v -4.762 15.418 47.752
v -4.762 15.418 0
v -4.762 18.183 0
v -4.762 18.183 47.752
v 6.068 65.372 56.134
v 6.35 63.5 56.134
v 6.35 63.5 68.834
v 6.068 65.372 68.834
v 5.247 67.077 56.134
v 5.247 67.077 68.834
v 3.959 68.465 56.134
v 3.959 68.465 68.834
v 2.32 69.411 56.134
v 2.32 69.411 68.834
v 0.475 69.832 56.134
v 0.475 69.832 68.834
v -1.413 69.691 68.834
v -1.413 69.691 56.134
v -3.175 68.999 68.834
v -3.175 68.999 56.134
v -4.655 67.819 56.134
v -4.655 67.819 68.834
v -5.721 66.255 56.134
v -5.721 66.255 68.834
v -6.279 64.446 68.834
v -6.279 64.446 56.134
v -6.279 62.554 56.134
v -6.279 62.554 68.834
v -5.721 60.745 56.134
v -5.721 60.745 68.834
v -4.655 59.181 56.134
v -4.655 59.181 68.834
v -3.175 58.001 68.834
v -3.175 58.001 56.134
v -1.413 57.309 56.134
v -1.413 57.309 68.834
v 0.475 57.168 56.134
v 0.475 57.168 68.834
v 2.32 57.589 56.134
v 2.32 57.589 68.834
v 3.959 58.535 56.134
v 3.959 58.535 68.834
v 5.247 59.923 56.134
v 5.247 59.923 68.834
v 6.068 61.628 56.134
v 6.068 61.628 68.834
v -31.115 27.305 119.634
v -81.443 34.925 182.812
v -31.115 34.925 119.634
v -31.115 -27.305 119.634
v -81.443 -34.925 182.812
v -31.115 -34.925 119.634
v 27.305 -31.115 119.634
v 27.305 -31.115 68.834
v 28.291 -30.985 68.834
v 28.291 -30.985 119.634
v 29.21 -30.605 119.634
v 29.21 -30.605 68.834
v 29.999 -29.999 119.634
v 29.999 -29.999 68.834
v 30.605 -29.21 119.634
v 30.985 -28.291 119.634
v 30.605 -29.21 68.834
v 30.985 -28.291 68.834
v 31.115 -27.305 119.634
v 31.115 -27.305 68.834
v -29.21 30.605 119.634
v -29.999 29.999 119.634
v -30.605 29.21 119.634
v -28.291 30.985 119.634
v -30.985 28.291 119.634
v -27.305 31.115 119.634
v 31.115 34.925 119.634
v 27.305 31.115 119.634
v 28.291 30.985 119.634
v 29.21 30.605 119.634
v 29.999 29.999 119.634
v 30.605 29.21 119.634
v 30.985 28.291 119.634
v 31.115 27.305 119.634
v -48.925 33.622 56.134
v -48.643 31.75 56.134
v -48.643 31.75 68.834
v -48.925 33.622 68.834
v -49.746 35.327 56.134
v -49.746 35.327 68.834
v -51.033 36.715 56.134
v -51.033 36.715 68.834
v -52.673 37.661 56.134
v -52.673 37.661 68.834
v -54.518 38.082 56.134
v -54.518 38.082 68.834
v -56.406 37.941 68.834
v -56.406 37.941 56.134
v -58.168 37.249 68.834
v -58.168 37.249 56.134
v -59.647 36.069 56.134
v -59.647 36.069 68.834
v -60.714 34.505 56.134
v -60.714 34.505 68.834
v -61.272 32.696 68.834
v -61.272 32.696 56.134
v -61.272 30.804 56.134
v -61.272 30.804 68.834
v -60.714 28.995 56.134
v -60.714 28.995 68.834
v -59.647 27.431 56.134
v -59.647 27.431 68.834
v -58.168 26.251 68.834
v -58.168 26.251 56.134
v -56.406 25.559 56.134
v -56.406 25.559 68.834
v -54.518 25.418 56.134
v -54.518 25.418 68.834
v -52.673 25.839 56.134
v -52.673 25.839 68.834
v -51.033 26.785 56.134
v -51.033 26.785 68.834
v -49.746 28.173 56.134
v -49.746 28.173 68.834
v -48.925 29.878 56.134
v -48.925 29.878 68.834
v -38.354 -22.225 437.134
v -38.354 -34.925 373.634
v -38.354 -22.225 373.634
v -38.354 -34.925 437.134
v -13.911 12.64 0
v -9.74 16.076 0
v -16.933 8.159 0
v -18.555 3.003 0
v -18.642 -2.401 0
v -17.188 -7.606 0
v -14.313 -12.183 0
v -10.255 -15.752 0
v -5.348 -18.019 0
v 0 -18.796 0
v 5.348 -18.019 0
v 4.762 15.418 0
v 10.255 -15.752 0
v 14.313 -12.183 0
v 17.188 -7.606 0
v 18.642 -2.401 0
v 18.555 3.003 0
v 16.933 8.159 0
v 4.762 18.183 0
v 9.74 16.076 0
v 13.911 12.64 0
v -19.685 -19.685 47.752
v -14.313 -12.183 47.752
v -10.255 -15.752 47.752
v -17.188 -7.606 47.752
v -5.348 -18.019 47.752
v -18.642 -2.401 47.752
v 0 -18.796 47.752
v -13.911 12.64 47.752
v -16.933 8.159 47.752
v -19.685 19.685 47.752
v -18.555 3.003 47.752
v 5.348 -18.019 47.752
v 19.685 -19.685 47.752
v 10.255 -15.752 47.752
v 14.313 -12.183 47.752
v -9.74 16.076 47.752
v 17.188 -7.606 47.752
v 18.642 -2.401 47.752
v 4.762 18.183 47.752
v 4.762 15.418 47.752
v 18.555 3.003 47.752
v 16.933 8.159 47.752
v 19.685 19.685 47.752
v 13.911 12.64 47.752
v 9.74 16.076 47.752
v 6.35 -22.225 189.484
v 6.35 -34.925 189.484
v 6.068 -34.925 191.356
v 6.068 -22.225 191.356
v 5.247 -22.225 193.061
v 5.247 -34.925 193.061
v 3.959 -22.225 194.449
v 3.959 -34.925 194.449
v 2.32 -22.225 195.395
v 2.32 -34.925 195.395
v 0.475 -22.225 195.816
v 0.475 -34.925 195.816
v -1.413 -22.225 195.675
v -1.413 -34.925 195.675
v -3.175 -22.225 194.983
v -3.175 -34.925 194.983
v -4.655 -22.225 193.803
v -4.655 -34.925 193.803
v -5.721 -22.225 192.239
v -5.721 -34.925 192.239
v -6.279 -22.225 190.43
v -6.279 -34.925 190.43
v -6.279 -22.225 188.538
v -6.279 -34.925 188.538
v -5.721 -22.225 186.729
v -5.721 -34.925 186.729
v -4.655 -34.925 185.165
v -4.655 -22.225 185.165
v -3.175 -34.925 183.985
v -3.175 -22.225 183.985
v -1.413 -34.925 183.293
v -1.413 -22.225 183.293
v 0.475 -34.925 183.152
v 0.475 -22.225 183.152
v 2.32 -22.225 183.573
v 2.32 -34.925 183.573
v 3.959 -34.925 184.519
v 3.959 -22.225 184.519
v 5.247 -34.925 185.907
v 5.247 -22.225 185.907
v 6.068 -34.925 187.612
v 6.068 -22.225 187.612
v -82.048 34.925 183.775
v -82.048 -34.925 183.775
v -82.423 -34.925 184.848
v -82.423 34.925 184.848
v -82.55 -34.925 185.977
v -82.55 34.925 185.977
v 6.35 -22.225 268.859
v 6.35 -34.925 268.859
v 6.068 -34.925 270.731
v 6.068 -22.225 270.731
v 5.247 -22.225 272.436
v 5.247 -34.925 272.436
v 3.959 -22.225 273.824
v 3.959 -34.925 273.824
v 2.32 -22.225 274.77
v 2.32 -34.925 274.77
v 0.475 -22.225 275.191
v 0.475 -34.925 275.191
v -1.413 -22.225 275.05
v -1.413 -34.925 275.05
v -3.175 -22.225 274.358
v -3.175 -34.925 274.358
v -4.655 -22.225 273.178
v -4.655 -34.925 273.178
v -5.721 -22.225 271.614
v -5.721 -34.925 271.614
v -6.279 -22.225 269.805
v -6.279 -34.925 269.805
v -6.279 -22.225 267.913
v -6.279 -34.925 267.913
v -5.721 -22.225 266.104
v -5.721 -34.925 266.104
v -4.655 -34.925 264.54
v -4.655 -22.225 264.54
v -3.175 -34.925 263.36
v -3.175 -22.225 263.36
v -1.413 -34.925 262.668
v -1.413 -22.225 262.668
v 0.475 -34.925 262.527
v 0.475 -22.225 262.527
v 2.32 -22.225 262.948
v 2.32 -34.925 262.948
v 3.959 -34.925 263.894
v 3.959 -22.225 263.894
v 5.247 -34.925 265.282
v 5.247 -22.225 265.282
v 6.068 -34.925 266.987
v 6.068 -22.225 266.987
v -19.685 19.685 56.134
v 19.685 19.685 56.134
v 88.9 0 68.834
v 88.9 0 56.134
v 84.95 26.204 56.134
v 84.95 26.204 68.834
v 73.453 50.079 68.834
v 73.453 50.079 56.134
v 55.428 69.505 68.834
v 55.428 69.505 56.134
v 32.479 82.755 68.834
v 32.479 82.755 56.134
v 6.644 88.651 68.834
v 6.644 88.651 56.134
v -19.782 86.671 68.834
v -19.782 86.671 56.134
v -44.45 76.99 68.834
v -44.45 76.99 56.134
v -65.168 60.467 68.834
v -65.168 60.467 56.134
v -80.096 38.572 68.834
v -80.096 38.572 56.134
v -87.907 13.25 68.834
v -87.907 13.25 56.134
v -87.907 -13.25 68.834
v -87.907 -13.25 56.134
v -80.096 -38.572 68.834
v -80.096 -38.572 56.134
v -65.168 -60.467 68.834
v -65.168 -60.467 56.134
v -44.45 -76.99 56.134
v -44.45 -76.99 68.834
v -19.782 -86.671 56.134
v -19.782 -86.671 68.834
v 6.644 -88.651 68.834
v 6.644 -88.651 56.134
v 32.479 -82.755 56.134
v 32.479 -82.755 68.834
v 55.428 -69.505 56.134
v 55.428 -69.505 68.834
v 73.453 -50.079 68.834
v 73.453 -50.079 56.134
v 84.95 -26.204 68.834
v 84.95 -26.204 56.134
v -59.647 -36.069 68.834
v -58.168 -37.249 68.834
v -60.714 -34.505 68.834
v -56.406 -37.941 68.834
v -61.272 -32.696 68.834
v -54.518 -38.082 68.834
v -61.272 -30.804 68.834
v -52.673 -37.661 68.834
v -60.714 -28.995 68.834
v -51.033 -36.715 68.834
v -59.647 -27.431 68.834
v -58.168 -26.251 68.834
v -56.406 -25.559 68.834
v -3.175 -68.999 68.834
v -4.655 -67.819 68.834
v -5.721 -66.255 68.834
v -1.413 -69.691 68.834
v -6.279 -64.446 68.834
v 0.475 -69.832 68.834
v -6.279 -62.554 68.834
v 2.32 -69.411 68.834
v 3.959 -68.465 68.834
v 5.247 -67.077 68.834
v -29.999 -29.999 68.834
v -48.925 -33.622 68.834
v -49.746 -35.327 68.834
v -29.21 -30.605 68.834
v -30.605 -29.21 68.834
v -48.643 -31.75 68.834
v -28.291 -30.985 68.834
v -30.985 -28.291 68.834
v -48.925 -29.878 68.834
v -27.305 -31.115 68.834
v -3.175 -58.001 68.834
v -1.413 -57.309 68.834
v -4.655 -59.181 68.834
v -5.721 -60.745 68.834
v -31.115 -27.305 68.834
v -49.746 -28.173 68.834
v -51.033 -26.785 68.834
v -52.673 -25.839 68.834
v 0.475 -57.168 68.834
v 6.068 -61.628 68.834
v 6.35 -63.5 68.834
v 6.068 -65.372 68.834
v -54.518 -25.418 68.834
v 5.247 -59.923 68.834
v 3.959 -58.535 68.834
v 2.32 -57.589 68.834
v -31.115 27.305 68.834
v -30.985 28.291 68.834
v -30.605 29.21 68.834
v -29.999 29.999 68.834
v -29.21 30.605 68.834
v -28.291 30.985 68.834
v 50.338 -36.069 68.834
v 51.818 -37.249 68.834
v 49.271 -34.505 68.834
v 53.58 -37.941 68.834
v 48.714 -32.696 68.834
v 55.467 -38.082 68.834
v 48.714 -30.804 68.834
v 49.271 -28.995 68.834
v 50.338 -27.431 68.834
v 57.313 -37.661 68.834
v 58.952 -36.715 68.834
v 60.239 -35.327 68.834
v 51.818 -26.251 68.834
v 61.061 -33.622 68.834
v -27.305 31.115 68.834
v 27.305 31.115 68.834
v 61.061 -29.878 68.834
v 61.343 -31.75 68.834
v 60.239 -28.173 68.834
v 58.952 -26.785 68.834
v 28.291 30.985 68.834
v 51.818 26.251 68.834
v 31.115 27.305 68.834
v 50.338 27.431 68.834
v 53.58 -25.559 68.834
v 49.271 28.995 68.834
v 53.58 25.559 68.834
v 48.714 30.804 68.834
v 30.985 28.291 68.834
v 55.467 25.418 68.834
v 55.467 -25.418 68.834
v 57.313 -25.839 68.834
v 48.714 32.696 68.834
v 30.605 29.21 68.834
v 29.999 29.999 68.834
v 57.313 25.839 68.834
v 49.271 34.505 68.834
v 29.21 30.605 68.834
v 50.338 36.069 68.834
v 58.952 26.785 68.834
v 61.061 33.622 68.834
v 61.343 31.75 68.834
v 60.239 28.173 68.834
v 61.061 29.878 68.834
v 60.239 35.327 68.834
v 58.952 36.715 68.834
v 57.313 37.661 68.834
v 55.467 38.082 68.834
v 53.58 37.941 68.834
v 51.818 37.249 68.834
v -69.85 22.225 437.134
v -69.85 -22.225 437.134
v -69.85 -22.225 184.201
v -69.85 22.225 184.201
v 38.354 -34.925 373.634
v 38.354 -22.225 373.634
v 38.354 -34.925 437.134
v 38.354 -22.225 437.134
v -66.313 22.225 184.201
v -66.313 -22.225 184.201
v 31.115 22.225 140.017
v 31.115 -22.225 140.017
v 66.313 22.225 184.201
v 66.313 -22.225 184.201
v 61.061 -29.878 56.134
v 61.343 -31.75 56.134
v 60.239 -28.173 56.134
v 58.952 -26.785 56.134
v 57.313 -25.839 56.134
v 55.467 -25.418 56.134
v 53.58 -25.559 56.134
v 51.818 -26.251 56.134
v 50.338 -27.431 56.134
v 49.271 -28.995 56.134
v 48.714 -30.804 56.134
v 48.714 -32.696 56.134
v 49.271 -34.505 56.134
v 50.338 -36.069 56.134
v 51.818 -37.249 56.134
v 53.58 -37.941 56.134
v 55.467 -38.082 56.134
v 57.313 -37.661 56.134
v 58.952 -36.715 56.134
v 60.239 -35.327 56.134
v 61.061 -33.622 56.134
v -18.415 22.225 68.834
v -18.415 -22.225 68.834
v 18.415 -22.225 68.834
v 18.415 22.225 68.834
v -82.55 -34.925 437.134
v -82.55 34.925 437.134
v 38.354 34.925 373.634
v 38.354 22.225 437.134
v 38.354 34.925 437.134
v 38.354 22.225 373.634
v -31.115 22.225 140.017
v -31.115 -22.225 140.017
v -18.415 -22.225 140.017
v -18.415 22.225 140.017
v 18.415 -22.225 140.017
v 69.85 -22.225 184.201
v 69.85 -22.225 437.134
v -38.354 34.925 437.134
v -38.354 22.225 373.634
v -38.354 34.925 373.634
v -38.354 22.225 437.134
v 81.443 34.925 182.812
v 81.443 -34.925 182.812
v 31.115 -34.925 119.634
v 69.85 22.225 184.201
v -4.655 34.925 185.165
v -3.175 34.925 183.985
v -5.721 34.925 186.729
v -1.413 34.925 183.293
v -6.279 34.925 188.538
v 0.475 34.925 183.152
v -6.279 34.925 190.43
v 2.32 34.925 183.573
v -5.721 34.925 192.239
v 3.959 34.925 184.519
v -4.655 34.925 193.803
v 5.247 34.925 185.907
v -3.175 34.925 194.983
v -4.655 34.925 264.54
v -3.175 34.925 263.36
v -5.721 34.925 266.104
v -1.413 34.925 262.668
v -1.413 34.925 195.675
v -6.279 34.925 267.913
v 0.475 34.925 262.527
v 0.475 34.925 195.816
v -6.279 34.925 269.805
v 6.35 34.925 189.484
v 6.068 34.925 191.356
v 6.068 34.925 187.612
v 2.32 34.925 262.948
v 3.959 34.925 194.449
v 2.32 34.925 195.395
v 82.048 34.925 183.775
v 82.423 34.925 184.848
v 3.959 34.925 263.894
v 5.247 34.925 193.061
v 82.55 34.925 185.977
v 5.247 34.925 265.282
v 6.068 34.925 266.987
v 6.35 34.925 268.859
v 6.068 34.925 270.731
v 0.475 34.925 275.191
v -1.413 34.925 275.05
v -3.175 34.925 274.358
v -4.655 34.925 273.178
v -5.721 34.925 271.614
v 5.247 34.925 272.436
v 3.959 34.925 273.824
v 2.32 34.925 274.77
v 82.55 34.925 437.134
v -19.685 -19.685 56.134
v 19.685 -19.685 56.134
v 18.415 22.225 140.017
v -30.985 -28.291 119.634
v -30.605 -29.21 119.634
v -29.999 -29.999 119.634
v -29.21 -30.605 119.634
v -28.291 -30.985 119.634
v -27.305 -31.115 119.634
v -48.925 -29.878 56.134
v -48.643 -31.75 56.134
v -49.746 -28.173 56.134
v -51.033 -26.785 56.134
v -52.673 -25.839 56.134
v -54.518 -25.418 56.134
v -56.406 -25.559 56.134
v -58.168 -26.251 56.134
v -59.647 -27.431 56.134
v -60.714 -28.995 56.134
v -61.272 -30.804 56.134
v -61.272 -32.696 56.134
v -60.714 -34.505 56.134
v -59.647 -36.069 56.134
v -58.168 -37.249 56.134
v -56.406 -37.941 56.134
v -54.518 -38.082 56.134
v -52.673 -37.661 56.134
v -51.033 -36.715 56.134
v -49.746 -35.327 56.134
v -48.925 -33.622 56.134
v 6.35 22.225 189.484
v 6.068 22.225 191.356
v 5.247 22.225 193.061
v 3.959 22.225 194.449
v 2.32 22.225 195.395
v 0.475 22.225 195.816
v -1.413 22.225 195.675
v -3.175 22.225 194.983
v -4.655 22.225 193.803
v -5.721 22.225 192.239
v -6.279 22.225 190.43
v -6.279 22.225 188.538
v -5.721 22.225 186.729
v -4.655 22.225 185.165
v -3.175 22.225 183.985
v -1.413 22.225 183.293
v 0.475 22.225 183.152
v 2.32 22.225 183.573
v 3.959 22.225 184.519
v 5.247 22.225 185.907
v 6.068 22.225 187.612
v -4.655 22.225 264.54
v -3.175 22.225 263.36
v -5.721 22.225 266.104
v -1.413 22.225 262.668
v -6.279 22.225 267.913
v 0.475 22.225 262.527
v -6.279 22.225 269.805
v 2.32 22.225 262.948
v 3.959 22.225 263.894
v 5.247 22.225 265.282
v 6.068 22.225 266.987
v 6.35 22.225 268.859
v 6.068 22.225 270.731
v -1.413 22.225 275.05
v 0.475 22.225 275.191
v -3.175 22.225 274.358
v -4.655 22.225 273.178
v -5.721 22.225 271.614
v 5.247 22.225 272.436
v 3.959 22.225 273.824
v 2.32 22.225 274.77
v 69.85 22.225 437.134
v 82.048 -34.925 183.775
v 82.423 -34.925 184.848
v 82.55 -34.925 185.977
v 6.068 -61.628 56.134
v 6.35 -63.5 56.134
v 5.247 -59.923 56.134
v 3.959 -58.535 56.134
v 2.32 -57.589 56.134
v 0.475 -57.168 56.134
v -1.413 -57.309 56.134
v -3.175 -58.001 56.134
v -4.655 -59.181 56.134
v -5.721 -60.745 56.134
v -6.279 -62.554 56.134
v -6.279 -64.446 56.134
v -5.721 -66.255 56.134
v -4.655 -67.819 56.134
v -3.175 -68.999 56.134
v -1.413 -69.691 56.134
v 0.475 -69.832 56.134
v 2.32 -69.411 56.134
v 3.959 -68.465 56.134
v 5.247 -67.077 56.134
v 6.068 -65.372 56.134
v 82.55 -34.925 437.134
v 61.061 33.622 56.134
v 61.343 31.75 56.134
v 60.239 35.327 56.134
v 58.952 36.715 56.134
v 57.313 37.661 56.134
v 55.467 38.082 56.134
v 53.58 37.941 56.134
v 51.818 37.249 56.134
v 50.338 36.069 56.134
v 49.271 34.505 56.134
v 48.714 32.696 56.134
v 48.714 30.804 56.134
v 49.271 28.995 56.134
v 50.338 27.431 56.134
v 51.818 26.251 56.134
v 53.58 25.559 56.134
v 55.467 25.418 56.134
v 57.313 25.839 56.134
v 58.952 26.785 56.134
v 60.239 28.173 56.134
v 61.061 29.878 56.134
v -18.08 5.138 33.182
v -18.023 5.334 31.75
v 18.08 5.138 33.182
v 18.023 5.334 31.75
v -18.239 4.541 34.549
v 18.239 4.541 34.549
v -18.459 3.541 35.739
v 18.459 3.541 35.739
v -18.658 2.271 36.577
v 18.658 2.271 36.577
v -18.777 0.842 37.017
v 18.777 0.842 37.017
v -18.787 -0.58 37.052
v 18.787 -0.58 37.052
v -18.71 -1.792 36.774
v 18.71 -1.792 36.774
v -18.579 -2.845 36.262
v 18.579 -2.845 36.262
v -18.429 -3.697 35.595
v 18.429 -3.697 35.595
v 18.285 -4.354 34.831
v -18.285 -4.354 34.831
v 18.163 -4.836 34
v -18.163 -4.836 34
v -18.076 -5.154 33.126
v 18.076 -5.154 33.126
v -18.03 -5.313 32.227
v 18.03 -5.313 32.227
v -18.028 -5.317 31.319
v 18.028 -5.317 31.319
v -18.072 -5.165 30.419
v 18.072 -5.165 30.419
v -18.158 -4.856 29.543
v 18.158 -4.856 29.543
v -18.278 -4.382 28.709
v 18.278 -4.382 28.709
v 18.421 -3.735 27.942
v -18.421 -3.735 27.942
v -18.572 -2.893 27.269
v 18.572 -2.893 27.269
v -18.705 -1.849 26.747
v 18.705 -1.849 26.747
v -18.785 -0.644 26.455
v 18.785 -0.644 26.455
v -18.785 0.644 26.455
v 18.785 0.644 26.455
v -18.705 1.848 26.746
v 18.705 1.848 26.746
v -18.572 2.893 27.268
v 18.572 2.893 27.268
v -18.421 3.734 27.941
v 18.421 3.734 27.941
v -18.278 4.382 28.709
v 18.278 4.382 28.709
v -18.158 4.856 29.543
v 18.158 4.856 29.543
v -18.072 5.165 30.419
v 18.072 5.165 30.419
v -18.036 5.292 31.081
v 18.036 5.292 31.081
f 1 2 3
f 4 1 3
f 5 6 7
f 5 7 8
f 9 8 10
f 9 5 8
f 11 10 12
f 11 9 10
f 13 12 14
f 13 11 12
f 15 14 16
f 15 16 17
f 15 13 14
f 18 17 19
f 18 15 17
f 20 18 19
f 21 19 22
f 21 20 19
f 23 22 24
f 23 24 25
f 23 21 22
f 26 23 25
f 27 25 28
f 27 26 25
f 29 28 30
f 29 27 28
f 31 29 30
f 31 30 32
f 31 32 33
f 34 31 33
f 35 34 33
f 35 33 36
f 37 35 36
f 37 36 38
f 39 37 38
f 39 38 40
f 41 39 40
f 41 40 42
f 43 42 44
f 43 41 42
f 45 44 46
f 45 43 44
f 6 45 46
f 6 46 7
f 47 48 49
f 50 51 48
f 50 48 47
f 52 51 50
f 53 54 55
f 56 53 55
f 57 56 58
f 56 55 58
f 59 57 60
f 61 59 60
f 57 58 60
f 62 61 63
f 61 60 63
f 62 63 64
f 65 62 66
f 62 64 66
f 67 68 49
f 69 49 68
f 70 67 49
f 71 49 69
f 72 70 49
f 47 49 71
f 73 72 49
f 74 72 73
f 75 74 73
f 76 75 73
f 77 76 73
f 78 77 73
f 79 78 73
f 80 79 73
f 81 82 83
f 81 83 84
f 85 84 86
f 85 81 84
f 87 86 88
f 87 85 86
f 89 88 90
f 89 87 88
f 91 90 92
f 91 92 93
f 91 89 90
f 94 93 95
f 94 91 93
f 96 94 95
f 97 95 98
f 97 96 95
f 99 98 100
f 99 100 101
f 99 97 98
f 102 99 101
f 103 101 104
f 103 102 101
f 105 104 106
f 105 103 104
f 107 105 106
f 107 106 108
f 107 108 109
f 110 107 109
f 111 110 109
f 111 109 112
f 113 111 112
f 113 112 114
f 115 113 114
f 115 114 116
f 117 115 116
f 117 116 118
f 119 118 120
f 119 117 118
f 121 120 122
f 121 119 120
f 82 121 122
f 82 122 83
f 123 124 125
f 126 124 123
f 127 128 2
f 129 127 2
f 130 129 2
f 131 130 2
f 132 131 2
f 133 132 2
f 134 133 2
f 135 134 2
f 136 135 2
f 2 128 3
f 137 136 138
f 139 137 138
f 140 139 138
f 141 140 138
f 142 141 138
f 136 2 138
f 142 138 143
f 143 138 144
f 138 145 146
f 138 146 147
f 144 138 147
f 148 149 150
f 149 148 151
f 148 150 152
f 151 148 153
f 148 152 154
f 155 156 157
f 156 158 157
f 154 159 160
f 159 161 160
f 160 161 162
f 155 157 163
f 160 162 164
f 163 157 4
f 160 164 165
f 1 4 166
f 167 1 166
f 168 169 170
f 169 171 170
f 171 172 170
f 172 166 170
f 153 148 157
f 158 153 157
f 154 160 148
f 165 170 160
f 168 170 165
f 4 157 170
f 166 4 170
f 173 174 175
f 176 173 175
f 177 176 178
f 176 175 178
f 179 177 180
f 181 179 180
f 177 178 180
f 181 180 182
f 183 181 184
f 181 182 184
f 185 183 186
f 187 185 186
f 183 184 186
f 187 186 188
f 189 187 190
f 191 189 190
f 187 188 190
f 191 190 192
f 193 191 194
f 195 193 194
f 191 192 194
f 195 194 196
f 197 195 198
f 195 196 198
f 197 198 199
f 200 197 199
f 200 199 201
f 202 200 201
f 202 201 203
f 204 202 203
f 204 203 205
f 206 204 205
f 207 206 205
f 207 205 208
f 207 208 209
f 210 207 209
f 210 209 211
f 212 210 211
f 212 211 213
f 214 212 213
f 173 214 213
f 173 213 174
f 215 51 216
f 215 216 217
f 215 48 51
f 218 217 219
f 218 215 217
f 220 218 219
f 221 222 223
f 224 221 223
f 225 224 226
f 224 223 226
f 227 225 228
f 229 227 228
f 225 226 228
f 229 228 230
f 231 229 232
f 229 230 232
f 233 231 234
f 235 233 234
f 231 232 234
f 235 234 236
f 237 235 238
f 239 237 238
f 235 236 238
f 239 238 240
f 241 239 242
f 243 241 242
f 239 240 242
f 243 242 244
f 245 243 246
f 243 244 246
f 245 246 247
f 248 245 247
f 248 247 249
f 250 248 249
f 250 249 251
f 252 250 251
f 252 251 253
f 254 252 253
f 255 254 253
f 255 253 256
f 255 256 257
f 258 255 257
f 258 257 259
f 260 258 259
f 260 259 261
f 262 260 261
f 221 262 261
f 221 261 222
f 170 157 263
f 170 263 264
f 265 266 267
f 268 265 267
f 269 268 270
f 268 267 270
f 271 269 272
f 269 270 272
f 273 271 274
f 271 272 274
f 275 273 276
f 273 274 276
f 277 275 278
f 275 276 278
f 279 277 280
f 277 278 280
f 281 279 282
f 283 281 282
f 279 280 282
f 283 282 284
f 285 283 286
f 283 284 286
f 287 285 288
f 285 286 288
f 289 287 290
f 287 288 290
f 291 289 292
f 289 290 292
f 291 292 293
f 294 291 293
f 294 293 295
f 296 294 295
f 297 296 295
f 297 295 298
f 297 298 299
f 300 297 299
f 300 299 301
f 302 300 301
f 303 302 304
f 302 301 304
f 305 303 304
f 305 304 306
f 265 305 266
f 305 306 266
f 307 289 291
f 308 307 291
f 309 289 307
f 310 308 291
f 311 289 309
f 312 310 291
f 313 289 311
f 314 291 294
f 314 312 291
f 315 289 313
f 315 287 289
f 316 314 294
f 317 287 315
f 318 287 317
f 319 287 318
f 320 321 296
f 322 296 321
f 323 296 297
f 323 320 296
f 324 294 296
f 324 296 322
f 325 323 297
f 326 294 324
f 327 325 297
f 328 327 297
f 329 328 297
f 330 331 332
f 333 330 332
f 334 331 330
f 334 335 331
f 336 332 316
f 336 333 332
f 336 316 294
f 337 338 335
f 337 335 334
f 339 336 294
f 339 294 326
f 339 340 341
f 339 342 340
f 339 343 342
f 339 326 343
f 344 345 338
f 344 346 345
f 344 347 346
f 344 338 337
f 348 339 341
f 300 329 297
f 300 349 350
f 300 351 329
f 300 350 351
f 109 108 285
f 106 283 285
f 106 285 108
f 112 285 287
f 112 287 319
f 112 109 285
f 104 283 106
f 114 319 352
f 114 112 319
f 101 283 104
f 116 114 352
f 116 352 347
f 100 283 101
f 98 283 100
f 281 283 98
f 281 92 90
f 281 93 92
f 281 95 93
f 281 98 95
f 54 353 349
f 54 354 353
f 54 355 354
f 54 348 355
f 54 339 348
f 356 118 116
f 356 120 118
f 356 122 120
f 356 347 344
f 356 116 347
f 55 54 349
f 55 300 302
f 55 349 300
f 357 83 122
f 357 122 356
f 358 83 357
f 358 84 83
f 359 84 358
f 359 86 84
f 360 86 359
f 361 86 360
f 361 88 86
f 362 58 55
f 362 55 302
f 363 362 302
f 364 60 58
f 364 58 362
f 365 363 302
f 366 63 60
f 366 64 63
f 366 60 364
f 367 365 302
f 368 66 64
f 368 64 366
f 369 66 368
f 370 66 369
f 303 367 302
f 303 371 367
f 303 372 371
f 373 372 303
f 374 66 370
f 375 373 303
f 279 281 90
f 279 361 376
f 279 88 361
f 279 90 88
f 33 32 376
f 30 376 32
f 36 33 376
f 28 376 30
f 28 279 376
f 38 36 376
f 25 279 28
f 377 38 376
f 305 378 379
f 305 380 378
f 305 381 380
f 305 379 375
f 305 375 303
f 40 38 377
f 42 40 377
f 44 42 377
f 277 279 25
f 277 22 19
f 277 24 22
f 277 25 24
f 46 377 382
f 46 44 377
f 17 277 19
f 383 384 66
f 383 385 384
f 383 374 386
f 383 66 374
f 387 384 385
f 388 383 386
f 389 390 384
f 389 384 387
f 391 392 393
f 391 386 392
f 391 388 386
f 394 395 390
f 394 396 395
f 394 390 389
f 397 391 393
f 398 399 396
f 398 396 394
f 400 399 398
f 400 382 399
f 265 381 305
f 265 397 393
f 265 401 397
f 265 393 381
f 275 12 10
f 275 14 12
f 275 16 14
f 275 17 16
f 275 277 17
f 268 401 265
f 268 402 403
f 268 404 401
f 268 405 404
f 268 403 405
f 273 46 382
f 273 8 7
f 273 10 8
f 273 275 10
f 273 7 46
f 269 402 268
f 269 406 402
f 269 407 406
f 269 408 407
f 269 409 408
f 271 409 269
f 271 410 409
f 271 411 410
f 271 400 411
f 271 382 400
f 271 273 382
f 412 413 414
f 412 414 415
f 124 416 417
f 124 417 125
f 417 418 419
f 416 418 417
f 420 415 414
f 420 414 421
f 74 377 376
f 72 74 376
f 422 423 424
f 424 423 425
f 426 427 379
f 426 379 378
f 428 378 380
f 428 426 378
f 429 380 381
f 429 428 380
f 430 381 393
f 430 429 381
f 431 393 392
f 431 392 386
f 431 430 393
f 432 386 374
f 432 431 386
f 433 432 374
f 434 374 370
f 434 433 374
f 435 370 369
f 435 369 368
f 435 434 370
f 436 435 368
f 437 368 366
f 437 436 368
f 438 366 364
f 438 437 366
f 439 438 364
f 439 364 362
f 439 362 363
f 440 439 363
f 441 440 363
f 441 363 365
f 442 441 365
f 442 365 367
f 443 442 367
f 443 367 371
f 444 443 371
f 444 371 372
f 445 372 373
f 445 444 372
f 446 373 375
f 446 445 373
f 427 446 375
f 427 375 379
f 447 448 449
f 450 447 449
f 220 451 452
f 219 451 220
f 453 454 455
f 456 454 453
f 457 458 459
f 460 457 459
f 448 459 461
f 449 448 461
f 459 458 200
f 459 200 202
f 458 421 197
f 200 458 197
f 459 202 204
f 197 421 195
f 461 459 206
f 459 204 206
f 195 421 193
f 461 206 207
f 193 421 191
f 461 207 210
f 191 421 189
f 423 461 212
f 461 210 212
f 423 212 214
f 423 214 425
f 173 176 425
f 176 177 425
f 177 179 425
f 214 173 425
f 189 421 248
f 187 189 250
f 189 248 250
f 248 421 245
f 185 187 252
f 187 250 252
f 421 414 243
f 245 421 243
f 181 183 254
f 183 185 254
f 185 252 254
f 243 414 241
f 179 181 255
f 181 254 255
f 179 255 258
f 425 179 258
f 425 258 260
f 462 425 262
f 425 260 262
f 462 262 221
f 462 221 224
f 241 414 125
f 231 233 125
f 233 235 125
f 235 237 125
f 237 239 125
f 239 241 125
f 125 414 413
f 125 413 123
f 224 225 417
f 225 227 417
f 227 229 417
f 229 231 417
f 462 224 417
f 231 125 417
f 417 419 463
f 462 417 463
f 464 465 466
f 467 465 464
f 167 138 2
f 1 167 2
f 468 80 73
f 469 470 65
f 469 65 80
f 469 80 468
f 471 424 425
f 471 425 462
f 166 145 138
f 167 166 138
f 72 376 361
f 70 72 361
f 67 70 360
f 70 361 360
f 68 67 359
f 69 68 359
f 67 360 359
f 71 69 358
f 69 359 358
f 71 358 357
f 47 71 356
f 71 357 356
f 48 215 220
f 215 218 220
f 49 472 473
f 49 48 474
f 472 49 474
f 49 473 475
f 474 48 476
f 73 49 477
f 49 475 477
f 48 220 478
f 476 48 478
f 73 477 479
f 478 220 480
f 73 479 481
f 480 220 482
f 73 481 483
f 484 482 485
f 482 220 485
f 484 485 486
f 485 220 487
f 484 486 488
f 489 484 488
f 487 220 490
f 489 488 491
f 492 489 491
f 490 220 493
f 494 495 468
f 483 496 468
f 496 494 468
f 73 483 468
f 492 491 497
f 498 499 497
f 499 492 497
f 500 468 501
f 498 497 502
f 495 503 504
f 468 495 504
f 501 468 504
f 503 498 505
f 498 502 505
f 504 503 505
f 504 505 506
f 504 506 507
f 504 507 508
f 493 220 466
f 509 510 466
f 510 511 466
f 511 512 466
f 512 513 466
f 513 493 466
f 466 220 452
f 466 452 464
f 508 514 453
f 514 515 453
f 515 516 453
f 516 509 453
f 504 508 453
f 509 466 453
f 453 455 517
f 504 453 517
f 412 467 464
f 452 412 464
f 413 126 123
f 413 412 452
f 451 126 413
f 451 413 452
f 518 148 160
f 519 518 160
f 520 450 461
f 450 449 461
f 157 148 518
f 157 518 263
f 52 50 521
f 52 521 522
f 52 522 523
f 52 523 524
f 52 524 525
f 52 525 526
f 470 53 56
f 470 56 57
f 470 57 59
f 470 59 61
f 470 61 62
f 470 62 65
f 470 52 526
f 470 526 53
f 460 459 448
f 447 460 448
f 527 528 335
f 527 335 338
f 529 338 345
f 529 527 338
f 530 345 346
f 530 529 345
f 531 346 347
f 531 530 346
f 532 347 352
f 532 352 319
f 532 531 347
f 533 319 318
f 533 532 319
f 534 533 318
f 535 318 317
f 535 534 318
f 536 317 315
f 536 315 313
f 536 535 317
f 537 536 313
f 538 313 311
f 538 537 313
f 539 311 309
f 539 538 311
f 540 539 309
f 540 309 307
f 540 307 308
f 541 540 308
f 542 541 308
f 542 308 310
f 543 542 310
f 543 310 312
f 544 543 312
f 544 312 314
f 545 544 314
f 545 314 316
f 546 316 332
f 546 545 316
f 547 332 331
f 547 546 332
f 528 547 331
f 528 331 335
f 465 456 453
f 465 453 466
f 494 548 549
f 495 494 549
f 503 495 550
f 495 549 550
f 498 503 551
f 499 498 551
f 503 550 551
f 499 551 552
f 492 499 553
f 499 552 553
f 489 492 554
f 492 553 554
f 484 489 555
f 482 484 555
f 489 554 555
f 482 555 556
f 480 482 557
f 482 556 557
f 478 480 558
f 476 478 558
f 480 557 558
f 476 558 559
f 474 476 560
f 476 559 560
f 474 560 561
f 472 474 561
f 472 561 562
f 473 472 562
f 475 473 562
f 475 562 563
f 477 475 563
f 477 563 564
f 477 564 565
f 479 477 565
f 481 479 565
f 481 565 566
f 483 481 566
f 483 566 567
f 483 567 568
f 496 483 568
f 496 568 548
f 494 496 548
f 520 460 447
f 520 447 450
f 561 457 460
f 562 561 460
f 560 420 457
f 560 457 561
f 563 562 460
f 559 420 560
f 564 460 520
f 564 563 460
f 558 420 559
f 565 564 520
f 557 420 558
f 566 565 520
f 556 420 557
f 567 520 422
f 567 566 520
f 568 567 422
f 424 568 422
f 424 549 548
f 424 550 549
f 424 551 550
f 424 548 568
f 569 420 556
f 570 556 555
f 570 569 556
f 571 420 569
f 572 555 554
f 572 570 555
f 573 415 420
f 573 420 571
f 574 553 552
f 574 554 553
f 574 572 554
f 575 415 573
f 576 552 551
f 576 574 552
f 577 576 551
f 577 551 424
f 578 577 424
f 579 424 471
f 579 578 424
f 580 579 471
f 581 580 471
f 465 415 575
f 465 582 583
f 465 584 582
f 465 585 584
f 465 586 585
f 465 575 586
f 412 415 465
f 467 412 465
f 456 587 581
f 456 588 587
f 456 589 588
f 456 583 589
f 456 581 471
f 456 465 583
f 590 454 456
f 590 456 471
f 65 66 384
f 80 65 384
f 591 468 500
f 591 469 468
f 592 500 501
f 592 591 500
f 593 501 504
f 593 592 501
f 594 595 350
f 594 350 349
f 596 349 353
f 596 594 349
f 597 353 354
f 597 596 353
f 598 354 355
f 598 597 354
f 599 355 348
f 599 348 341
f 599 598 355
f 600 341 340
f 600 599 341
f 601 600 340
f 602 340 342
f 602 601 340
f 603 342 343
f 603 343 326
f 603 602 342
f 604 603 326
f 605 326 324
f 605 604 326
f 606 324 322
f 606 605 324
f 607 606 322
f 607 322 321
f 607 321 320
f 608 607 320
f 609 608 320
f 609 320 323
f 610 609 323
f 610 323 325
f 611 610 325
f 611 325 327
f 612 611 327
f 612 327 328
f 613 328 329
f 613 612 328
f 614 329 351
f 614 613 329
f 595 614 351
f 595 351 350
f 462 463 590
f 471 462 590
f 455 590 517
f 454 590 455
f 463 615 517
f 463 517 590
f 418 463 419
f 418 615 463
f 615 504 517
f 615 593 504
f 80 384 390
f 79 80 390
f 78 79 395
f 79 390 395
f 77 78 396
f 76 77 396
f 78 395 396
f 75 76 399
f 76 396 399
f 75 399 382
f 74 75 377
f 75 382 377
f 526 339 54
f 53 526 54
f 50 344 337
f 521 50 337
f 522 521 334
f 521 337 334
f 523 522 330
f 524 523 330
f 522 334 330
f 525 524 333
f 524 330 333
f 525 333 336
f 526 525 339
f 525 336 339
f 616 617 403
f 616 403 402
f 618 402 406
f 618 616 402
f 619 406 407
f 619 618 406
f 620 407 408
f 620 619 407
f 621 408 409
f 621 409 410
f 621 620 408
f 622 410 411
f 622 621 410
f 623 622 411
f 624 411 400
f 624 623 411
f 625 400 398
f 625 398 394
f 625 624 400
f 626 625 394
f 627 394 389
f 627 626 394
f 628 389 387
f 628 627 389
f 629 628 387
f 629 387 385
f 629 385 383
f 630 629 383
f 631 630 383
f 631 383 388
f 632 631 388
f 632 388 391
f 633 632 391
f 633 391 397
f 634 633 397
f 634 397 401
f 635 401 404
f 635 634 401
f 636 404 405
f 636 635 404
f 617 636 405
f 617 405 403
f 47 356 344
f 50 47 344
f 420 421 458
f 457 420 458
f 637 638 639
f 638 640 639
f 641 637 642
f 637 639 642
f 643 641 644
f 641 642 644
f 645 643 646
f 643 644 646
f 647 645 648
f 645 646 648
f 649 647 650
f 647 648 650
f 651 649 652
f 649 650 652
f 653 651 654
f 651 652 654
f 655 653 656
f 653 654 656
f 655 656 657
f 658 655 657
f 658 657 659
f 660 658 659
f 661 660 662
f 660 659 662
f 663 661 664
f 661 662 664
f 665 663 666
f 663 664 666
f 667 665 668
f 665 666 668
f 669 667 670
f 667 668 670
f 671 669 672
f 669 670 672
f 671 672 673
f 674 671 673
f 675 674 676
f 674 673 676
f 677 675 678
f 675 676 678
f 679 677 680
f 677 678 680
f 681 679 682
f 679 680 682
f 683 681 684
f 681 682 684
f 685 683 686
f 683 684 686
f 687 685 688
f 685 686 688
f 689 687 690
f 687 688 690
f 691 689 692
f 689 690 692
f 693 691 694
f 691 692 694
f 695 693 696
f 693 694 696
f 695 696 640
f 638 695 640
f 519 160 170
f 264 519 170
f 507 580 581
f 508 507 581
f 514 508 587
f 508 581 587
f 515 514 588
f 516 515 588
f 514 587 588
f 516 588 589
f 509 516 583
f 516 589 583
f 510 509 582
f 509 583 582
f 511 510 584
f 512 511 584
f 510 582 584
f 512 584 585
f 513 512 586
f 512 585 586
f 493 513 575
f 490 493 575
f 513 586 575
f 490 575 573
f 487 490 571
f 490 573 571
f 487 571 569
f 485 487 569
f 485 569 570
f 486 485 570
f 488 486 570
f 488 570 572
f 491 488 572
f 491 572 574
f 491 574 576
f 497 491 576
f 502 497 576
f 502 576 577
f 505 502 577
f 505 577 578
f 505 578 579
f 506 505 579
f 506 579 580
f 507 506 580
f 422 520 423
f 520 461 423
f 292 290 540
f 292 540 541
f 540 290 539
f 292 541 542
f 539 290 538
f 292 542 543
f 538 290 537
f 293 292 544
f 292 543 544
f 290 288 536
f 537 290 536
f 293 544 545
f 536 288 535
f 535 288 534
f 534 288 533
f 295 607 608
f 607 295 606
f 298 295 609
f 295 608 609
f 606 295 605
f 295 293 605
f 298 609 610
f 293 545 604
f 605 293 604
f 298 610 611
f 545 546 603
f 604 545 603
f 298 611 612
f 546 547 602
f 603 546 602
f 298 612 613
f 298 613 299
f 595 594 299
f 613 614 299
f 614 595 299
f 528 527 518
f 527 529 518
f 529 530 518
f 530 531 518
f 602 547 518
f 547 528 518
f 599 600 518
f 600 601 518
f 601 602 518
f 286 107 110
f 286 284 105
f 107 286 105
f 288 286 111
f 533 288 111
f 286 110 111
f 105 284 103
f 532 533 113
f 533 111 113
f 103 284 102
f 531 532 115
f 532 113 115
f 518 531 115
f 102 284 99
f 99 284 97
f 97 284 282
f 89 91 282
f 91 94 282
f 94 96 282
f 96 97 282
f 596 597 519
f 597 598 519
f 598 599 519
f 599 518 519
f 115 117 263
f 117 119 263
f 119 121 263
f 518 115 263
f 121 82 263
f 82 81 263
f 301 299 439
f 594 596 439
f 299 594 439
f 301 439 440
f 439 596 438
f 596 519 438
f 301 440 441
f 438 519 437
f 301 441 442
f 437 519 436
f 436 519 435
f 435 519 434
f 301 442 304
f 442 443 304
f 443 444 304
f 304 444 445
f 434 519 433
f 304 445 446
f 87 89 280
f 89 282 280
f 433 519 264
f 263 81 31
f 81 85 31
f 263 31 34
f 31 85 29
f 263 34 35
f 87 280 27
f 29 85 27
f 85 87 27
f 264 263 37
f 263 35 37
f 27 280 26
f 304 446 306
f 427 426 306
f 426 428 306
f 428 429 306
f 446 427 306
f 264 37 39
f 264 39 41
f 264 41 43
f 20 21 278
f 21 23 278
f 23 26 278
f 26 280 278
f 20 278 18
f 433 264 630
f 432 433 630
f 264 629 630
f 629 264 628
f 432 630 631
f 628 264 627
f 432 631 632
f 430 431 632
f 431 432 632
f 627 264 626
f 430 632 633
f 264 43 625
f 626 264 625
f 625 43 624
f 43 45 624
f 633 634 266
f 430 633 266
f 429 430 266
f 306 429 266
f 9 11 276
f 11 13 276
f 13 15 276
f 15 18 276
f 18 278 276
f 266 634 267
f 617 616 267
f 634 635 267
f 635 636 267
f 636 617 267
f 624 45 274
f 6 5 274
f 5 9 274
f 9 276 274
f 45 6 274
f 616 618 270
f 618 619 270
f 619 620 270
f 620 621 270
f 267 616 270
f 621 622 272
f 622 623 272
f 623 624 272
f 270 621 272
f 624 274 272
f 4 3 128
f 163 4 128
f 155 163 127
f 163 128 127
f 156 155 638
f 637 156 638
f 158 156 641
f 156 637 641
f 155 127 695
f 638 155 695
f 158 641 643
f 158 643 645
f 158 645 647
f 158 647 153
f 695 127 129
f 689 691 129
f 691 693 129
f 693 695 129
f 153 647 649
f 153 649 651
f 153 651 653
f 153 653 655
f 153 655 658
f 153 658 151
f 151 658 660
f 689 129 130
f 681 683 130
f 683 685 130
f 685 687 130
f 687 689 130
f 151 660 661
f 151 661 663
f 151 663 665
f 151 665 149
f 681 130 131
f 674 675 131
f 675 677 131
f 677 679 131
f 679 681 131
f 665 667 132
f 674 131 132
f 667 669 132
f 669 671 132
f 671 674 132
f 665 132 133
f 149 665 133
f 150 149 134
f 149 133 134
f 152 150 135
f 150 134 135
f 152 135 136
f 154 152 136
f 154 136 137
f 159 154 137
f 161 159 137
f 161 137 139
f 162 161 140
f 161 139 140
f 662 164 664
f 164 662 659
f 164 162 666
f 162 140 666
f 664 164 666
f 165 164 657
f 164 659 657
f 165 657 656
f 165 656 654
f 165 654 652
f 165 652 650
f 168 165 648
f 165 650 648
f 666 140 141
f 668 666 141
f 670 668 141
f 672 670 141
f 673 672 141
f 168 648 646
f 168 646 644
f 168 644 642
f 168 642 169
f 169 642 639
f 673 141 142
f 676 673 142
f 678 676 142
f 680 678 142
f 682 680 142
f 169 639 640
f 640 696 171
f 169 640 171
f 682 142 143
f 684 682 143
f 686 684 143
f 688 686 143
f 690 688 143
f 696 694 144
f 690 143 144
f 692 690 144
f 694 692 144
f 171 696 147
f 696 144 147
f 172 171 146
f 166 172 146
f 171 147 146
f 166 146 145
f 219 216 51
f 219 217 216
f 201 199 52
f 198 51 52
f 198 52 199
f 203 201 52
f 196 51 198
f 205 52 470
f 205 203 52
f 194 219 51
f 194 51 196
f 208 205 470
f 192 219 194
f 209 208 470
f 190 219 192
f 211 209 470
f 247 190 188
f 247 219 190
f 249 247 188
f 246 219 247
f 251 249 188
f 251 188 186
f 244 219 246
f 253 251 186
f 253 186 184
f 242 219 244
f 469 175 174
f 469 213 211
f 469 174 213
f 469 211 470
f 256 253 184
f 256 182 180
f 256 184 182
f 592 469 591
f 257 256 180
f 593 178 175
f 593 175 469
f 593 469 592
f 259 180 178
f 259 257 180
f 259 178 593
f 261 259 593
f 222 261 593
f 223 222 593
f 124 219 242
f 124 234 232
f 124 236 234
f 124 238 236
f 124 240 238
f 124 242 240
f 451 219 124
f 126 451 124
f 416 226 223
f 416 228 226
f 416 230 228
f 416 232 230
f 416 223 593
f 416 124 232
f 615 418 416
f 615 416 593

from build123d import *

# Parameters (mm, degrees)
F1_DEPTH      = 47.752
F2_W          = 39.37
F2_H          = 39.37
F3_DEPTH      = 8.382
F4_R          = 88.9
F4_R_2        = 6.35
F5_DEPTH      = 12.7
F7_DEPTH      = 50.8
F8_R          = 5.334
F9_DEPTH      = 88.901
F9_DEPTH_BACK = 127
F10_W         = 36.83
F10_H         = 36.83
F11_DEPTH     = 50.8
F13_DEPTH     = 34.925
F14_W         = 139.7
F14_H         = 44.45
F15_DEPTH     = 252.932645439
F17_DEPTH     = 22.225
F18_R         = 5.08
F19_R         = 6.35
F20_DEPTH     = 123.826


with BuildPart() as f1:
    # F0 (on Top) → F1 (new body)
    with BuildSketch(Plane.XY):
        with BuildLine():
            Line((-4.7625, 15.4178), (-4.7625, 18.1826348407))
            ThreePointArc((-4.7625, 18.1826348407), (0, -18.796), (4.7625, 18.1826348407))
            Line((4.7625, 18.1826348407), (4.7625, 15.4178))
            Line((4.7625, 15.4178), (-4.7625, 15.4178))
        make_face()
    extrude(amount=F1_DEPTH)

    # F2 (on face) → F3 (join)
    with BuildSketch(Plane.XY.offset(47.752)):
        Rectangle(F2_W, F2_H)
    extrude(amount=F3_DEPTH)

    # F4 (on face) → F5 (join)
    with BuildSketch(Plane.XY.offset(56.134)):
        Circle(F4_R)
        with Locations((-54.9926131403, -31.75)):
            Circle(F4_R_2, mode=Mode.SUBTRACT)
        with Locations((0, -63.5)):
            Circle(F4_R_2, mode=Mode.SUBTRACT)
        with Locations((54.9926131403, -31.75)):
            Circle(F4_R_2, mode=Mode.SUBTRACT)
        with Locations((-54.9926131403, 31.75)):
            Circle(F4_R_2, mode=Mode.SUBTRACT)
        with Locations((54.9926131403, 31.75)):
            Circle(F4_R_2, mode=Mode.SUBTRACT)
        with Locations((0, 63.5)):
            Circle(F4_R_2, mode=Mode.SUBTRACT)
    extrude(amount=F5_DEPTH)

    # F6 (on face) → F7 (join)
    with BuildSketch(Plane.XY.offset(68.834)):
        with BuildLine():
            Line((27.305, 31.115), (-27.305, 31.115))
            ThreePointArc((-27.305, 31.115), (-29.9990768363, 29.9990768363), (-31.115, 27.305))
            Line((-31.115, 27.305), (-31.115, -27.305))
            ThreePointArc((-31.115, -27.305), (-29.9990768363, -29.9990768363), (-27.305, -31.115))
            Line((-27.305, -31.115), (27.305, -31.115))
            ThreePointArc((27.305, -31.115), (29.9990768363, -29.9990768363), (31.115, -27.305))
            Line((31.115, -27.305), (31.115, 27.305))
            ThreePointArc((31.115, 27.305), (29.9990768363, 29.9990768363), (27.305, 31.115))
        make_face()
    extrude(amount=F7_DEPTH)

    # F8 (on Right) → F9 (cut, two sides)
    with BuildSketch(Plane.YZ) as f9_sk:
        with Locations((0, 31.75)):
            Circle(F8_R)
    extrude(amount=F9_DEPTH, mode=Mode.SUBTRACT)
    extrude(f9_sk.sketch, amount=-F9_DEPTH_BACK, mode=Mode.SUBTRACT)

    # F10 (on face) → F11 (cut, through all)
    with BuildSketch(Plane.XY.offset(119.634)):
        Rectangle(F10_W, F10_H)
    extrude(amount=-F11_DEPTH, mode=Mode.SUBTRACT)

    # F12 (on Front) → F13 (join, symmetric)
    with BuildSketch(Plane.XZ):
        Polygon((0, 119.634), (31.115, 119.634), (82.55, 184.201354561), (82.55, 437.134), (38.354, 437.134), (38.354, 373.634), (0, 373.634), (-38.354, 373.634), (-38.354, 437.134), (-82.55, 437.134), (-82.55, 184.201354561), (-31.115, 119.634), align=None)
    extrude(amount=F13_DEPTH, both=True)

    # F14 (on face) → F15 (cut, through all)
    with BuildSketch(Plane.XY.offset(437.134)):
        Rectangle(F14_W, F14_H)
    extrude(amount=-F15_DEPTH, mode=Mode.SUBTRACT)

    # F16 (on Front) → F17 (cut, symmetric)
    with BuildSketch(Plane.XZ):
        Polygon((31.115, 140.0167160494), (66.3129246679, 184.201354561), (-66.3129246679, 184.201354561), (-31.115, 140.0167160494), (-18.415, 140.0167160494), (-18.415, 68.834), (18.415, 68.834), (18.415, 140.0167160494), align=None)
    extrude(amount=F17_DEPTH, both=True, mode=Mode.SUBTRACT)

    # F18
    f18_edges = [f1.edges().sort_by_distance(p)[0] for p in [
        (82.55, 0, 184.201355),
        (-82.55, 0, 184.201355),
    ]]
    fillet(f18_edges, radius=F18_R)

    # F19 (on face) → F20 (cut, through all)
    with BuildSketch(Plane.XZ.offset(34.925)):
        with Locations((0, 189.484)):
            Circle(F19_R)
        with Locations((0, 268.859)):
            Circle(F19_R)
    extrude(amount=-F20_DEPTH, mode=Mode.SUBTRACT)


solid = f1.part
